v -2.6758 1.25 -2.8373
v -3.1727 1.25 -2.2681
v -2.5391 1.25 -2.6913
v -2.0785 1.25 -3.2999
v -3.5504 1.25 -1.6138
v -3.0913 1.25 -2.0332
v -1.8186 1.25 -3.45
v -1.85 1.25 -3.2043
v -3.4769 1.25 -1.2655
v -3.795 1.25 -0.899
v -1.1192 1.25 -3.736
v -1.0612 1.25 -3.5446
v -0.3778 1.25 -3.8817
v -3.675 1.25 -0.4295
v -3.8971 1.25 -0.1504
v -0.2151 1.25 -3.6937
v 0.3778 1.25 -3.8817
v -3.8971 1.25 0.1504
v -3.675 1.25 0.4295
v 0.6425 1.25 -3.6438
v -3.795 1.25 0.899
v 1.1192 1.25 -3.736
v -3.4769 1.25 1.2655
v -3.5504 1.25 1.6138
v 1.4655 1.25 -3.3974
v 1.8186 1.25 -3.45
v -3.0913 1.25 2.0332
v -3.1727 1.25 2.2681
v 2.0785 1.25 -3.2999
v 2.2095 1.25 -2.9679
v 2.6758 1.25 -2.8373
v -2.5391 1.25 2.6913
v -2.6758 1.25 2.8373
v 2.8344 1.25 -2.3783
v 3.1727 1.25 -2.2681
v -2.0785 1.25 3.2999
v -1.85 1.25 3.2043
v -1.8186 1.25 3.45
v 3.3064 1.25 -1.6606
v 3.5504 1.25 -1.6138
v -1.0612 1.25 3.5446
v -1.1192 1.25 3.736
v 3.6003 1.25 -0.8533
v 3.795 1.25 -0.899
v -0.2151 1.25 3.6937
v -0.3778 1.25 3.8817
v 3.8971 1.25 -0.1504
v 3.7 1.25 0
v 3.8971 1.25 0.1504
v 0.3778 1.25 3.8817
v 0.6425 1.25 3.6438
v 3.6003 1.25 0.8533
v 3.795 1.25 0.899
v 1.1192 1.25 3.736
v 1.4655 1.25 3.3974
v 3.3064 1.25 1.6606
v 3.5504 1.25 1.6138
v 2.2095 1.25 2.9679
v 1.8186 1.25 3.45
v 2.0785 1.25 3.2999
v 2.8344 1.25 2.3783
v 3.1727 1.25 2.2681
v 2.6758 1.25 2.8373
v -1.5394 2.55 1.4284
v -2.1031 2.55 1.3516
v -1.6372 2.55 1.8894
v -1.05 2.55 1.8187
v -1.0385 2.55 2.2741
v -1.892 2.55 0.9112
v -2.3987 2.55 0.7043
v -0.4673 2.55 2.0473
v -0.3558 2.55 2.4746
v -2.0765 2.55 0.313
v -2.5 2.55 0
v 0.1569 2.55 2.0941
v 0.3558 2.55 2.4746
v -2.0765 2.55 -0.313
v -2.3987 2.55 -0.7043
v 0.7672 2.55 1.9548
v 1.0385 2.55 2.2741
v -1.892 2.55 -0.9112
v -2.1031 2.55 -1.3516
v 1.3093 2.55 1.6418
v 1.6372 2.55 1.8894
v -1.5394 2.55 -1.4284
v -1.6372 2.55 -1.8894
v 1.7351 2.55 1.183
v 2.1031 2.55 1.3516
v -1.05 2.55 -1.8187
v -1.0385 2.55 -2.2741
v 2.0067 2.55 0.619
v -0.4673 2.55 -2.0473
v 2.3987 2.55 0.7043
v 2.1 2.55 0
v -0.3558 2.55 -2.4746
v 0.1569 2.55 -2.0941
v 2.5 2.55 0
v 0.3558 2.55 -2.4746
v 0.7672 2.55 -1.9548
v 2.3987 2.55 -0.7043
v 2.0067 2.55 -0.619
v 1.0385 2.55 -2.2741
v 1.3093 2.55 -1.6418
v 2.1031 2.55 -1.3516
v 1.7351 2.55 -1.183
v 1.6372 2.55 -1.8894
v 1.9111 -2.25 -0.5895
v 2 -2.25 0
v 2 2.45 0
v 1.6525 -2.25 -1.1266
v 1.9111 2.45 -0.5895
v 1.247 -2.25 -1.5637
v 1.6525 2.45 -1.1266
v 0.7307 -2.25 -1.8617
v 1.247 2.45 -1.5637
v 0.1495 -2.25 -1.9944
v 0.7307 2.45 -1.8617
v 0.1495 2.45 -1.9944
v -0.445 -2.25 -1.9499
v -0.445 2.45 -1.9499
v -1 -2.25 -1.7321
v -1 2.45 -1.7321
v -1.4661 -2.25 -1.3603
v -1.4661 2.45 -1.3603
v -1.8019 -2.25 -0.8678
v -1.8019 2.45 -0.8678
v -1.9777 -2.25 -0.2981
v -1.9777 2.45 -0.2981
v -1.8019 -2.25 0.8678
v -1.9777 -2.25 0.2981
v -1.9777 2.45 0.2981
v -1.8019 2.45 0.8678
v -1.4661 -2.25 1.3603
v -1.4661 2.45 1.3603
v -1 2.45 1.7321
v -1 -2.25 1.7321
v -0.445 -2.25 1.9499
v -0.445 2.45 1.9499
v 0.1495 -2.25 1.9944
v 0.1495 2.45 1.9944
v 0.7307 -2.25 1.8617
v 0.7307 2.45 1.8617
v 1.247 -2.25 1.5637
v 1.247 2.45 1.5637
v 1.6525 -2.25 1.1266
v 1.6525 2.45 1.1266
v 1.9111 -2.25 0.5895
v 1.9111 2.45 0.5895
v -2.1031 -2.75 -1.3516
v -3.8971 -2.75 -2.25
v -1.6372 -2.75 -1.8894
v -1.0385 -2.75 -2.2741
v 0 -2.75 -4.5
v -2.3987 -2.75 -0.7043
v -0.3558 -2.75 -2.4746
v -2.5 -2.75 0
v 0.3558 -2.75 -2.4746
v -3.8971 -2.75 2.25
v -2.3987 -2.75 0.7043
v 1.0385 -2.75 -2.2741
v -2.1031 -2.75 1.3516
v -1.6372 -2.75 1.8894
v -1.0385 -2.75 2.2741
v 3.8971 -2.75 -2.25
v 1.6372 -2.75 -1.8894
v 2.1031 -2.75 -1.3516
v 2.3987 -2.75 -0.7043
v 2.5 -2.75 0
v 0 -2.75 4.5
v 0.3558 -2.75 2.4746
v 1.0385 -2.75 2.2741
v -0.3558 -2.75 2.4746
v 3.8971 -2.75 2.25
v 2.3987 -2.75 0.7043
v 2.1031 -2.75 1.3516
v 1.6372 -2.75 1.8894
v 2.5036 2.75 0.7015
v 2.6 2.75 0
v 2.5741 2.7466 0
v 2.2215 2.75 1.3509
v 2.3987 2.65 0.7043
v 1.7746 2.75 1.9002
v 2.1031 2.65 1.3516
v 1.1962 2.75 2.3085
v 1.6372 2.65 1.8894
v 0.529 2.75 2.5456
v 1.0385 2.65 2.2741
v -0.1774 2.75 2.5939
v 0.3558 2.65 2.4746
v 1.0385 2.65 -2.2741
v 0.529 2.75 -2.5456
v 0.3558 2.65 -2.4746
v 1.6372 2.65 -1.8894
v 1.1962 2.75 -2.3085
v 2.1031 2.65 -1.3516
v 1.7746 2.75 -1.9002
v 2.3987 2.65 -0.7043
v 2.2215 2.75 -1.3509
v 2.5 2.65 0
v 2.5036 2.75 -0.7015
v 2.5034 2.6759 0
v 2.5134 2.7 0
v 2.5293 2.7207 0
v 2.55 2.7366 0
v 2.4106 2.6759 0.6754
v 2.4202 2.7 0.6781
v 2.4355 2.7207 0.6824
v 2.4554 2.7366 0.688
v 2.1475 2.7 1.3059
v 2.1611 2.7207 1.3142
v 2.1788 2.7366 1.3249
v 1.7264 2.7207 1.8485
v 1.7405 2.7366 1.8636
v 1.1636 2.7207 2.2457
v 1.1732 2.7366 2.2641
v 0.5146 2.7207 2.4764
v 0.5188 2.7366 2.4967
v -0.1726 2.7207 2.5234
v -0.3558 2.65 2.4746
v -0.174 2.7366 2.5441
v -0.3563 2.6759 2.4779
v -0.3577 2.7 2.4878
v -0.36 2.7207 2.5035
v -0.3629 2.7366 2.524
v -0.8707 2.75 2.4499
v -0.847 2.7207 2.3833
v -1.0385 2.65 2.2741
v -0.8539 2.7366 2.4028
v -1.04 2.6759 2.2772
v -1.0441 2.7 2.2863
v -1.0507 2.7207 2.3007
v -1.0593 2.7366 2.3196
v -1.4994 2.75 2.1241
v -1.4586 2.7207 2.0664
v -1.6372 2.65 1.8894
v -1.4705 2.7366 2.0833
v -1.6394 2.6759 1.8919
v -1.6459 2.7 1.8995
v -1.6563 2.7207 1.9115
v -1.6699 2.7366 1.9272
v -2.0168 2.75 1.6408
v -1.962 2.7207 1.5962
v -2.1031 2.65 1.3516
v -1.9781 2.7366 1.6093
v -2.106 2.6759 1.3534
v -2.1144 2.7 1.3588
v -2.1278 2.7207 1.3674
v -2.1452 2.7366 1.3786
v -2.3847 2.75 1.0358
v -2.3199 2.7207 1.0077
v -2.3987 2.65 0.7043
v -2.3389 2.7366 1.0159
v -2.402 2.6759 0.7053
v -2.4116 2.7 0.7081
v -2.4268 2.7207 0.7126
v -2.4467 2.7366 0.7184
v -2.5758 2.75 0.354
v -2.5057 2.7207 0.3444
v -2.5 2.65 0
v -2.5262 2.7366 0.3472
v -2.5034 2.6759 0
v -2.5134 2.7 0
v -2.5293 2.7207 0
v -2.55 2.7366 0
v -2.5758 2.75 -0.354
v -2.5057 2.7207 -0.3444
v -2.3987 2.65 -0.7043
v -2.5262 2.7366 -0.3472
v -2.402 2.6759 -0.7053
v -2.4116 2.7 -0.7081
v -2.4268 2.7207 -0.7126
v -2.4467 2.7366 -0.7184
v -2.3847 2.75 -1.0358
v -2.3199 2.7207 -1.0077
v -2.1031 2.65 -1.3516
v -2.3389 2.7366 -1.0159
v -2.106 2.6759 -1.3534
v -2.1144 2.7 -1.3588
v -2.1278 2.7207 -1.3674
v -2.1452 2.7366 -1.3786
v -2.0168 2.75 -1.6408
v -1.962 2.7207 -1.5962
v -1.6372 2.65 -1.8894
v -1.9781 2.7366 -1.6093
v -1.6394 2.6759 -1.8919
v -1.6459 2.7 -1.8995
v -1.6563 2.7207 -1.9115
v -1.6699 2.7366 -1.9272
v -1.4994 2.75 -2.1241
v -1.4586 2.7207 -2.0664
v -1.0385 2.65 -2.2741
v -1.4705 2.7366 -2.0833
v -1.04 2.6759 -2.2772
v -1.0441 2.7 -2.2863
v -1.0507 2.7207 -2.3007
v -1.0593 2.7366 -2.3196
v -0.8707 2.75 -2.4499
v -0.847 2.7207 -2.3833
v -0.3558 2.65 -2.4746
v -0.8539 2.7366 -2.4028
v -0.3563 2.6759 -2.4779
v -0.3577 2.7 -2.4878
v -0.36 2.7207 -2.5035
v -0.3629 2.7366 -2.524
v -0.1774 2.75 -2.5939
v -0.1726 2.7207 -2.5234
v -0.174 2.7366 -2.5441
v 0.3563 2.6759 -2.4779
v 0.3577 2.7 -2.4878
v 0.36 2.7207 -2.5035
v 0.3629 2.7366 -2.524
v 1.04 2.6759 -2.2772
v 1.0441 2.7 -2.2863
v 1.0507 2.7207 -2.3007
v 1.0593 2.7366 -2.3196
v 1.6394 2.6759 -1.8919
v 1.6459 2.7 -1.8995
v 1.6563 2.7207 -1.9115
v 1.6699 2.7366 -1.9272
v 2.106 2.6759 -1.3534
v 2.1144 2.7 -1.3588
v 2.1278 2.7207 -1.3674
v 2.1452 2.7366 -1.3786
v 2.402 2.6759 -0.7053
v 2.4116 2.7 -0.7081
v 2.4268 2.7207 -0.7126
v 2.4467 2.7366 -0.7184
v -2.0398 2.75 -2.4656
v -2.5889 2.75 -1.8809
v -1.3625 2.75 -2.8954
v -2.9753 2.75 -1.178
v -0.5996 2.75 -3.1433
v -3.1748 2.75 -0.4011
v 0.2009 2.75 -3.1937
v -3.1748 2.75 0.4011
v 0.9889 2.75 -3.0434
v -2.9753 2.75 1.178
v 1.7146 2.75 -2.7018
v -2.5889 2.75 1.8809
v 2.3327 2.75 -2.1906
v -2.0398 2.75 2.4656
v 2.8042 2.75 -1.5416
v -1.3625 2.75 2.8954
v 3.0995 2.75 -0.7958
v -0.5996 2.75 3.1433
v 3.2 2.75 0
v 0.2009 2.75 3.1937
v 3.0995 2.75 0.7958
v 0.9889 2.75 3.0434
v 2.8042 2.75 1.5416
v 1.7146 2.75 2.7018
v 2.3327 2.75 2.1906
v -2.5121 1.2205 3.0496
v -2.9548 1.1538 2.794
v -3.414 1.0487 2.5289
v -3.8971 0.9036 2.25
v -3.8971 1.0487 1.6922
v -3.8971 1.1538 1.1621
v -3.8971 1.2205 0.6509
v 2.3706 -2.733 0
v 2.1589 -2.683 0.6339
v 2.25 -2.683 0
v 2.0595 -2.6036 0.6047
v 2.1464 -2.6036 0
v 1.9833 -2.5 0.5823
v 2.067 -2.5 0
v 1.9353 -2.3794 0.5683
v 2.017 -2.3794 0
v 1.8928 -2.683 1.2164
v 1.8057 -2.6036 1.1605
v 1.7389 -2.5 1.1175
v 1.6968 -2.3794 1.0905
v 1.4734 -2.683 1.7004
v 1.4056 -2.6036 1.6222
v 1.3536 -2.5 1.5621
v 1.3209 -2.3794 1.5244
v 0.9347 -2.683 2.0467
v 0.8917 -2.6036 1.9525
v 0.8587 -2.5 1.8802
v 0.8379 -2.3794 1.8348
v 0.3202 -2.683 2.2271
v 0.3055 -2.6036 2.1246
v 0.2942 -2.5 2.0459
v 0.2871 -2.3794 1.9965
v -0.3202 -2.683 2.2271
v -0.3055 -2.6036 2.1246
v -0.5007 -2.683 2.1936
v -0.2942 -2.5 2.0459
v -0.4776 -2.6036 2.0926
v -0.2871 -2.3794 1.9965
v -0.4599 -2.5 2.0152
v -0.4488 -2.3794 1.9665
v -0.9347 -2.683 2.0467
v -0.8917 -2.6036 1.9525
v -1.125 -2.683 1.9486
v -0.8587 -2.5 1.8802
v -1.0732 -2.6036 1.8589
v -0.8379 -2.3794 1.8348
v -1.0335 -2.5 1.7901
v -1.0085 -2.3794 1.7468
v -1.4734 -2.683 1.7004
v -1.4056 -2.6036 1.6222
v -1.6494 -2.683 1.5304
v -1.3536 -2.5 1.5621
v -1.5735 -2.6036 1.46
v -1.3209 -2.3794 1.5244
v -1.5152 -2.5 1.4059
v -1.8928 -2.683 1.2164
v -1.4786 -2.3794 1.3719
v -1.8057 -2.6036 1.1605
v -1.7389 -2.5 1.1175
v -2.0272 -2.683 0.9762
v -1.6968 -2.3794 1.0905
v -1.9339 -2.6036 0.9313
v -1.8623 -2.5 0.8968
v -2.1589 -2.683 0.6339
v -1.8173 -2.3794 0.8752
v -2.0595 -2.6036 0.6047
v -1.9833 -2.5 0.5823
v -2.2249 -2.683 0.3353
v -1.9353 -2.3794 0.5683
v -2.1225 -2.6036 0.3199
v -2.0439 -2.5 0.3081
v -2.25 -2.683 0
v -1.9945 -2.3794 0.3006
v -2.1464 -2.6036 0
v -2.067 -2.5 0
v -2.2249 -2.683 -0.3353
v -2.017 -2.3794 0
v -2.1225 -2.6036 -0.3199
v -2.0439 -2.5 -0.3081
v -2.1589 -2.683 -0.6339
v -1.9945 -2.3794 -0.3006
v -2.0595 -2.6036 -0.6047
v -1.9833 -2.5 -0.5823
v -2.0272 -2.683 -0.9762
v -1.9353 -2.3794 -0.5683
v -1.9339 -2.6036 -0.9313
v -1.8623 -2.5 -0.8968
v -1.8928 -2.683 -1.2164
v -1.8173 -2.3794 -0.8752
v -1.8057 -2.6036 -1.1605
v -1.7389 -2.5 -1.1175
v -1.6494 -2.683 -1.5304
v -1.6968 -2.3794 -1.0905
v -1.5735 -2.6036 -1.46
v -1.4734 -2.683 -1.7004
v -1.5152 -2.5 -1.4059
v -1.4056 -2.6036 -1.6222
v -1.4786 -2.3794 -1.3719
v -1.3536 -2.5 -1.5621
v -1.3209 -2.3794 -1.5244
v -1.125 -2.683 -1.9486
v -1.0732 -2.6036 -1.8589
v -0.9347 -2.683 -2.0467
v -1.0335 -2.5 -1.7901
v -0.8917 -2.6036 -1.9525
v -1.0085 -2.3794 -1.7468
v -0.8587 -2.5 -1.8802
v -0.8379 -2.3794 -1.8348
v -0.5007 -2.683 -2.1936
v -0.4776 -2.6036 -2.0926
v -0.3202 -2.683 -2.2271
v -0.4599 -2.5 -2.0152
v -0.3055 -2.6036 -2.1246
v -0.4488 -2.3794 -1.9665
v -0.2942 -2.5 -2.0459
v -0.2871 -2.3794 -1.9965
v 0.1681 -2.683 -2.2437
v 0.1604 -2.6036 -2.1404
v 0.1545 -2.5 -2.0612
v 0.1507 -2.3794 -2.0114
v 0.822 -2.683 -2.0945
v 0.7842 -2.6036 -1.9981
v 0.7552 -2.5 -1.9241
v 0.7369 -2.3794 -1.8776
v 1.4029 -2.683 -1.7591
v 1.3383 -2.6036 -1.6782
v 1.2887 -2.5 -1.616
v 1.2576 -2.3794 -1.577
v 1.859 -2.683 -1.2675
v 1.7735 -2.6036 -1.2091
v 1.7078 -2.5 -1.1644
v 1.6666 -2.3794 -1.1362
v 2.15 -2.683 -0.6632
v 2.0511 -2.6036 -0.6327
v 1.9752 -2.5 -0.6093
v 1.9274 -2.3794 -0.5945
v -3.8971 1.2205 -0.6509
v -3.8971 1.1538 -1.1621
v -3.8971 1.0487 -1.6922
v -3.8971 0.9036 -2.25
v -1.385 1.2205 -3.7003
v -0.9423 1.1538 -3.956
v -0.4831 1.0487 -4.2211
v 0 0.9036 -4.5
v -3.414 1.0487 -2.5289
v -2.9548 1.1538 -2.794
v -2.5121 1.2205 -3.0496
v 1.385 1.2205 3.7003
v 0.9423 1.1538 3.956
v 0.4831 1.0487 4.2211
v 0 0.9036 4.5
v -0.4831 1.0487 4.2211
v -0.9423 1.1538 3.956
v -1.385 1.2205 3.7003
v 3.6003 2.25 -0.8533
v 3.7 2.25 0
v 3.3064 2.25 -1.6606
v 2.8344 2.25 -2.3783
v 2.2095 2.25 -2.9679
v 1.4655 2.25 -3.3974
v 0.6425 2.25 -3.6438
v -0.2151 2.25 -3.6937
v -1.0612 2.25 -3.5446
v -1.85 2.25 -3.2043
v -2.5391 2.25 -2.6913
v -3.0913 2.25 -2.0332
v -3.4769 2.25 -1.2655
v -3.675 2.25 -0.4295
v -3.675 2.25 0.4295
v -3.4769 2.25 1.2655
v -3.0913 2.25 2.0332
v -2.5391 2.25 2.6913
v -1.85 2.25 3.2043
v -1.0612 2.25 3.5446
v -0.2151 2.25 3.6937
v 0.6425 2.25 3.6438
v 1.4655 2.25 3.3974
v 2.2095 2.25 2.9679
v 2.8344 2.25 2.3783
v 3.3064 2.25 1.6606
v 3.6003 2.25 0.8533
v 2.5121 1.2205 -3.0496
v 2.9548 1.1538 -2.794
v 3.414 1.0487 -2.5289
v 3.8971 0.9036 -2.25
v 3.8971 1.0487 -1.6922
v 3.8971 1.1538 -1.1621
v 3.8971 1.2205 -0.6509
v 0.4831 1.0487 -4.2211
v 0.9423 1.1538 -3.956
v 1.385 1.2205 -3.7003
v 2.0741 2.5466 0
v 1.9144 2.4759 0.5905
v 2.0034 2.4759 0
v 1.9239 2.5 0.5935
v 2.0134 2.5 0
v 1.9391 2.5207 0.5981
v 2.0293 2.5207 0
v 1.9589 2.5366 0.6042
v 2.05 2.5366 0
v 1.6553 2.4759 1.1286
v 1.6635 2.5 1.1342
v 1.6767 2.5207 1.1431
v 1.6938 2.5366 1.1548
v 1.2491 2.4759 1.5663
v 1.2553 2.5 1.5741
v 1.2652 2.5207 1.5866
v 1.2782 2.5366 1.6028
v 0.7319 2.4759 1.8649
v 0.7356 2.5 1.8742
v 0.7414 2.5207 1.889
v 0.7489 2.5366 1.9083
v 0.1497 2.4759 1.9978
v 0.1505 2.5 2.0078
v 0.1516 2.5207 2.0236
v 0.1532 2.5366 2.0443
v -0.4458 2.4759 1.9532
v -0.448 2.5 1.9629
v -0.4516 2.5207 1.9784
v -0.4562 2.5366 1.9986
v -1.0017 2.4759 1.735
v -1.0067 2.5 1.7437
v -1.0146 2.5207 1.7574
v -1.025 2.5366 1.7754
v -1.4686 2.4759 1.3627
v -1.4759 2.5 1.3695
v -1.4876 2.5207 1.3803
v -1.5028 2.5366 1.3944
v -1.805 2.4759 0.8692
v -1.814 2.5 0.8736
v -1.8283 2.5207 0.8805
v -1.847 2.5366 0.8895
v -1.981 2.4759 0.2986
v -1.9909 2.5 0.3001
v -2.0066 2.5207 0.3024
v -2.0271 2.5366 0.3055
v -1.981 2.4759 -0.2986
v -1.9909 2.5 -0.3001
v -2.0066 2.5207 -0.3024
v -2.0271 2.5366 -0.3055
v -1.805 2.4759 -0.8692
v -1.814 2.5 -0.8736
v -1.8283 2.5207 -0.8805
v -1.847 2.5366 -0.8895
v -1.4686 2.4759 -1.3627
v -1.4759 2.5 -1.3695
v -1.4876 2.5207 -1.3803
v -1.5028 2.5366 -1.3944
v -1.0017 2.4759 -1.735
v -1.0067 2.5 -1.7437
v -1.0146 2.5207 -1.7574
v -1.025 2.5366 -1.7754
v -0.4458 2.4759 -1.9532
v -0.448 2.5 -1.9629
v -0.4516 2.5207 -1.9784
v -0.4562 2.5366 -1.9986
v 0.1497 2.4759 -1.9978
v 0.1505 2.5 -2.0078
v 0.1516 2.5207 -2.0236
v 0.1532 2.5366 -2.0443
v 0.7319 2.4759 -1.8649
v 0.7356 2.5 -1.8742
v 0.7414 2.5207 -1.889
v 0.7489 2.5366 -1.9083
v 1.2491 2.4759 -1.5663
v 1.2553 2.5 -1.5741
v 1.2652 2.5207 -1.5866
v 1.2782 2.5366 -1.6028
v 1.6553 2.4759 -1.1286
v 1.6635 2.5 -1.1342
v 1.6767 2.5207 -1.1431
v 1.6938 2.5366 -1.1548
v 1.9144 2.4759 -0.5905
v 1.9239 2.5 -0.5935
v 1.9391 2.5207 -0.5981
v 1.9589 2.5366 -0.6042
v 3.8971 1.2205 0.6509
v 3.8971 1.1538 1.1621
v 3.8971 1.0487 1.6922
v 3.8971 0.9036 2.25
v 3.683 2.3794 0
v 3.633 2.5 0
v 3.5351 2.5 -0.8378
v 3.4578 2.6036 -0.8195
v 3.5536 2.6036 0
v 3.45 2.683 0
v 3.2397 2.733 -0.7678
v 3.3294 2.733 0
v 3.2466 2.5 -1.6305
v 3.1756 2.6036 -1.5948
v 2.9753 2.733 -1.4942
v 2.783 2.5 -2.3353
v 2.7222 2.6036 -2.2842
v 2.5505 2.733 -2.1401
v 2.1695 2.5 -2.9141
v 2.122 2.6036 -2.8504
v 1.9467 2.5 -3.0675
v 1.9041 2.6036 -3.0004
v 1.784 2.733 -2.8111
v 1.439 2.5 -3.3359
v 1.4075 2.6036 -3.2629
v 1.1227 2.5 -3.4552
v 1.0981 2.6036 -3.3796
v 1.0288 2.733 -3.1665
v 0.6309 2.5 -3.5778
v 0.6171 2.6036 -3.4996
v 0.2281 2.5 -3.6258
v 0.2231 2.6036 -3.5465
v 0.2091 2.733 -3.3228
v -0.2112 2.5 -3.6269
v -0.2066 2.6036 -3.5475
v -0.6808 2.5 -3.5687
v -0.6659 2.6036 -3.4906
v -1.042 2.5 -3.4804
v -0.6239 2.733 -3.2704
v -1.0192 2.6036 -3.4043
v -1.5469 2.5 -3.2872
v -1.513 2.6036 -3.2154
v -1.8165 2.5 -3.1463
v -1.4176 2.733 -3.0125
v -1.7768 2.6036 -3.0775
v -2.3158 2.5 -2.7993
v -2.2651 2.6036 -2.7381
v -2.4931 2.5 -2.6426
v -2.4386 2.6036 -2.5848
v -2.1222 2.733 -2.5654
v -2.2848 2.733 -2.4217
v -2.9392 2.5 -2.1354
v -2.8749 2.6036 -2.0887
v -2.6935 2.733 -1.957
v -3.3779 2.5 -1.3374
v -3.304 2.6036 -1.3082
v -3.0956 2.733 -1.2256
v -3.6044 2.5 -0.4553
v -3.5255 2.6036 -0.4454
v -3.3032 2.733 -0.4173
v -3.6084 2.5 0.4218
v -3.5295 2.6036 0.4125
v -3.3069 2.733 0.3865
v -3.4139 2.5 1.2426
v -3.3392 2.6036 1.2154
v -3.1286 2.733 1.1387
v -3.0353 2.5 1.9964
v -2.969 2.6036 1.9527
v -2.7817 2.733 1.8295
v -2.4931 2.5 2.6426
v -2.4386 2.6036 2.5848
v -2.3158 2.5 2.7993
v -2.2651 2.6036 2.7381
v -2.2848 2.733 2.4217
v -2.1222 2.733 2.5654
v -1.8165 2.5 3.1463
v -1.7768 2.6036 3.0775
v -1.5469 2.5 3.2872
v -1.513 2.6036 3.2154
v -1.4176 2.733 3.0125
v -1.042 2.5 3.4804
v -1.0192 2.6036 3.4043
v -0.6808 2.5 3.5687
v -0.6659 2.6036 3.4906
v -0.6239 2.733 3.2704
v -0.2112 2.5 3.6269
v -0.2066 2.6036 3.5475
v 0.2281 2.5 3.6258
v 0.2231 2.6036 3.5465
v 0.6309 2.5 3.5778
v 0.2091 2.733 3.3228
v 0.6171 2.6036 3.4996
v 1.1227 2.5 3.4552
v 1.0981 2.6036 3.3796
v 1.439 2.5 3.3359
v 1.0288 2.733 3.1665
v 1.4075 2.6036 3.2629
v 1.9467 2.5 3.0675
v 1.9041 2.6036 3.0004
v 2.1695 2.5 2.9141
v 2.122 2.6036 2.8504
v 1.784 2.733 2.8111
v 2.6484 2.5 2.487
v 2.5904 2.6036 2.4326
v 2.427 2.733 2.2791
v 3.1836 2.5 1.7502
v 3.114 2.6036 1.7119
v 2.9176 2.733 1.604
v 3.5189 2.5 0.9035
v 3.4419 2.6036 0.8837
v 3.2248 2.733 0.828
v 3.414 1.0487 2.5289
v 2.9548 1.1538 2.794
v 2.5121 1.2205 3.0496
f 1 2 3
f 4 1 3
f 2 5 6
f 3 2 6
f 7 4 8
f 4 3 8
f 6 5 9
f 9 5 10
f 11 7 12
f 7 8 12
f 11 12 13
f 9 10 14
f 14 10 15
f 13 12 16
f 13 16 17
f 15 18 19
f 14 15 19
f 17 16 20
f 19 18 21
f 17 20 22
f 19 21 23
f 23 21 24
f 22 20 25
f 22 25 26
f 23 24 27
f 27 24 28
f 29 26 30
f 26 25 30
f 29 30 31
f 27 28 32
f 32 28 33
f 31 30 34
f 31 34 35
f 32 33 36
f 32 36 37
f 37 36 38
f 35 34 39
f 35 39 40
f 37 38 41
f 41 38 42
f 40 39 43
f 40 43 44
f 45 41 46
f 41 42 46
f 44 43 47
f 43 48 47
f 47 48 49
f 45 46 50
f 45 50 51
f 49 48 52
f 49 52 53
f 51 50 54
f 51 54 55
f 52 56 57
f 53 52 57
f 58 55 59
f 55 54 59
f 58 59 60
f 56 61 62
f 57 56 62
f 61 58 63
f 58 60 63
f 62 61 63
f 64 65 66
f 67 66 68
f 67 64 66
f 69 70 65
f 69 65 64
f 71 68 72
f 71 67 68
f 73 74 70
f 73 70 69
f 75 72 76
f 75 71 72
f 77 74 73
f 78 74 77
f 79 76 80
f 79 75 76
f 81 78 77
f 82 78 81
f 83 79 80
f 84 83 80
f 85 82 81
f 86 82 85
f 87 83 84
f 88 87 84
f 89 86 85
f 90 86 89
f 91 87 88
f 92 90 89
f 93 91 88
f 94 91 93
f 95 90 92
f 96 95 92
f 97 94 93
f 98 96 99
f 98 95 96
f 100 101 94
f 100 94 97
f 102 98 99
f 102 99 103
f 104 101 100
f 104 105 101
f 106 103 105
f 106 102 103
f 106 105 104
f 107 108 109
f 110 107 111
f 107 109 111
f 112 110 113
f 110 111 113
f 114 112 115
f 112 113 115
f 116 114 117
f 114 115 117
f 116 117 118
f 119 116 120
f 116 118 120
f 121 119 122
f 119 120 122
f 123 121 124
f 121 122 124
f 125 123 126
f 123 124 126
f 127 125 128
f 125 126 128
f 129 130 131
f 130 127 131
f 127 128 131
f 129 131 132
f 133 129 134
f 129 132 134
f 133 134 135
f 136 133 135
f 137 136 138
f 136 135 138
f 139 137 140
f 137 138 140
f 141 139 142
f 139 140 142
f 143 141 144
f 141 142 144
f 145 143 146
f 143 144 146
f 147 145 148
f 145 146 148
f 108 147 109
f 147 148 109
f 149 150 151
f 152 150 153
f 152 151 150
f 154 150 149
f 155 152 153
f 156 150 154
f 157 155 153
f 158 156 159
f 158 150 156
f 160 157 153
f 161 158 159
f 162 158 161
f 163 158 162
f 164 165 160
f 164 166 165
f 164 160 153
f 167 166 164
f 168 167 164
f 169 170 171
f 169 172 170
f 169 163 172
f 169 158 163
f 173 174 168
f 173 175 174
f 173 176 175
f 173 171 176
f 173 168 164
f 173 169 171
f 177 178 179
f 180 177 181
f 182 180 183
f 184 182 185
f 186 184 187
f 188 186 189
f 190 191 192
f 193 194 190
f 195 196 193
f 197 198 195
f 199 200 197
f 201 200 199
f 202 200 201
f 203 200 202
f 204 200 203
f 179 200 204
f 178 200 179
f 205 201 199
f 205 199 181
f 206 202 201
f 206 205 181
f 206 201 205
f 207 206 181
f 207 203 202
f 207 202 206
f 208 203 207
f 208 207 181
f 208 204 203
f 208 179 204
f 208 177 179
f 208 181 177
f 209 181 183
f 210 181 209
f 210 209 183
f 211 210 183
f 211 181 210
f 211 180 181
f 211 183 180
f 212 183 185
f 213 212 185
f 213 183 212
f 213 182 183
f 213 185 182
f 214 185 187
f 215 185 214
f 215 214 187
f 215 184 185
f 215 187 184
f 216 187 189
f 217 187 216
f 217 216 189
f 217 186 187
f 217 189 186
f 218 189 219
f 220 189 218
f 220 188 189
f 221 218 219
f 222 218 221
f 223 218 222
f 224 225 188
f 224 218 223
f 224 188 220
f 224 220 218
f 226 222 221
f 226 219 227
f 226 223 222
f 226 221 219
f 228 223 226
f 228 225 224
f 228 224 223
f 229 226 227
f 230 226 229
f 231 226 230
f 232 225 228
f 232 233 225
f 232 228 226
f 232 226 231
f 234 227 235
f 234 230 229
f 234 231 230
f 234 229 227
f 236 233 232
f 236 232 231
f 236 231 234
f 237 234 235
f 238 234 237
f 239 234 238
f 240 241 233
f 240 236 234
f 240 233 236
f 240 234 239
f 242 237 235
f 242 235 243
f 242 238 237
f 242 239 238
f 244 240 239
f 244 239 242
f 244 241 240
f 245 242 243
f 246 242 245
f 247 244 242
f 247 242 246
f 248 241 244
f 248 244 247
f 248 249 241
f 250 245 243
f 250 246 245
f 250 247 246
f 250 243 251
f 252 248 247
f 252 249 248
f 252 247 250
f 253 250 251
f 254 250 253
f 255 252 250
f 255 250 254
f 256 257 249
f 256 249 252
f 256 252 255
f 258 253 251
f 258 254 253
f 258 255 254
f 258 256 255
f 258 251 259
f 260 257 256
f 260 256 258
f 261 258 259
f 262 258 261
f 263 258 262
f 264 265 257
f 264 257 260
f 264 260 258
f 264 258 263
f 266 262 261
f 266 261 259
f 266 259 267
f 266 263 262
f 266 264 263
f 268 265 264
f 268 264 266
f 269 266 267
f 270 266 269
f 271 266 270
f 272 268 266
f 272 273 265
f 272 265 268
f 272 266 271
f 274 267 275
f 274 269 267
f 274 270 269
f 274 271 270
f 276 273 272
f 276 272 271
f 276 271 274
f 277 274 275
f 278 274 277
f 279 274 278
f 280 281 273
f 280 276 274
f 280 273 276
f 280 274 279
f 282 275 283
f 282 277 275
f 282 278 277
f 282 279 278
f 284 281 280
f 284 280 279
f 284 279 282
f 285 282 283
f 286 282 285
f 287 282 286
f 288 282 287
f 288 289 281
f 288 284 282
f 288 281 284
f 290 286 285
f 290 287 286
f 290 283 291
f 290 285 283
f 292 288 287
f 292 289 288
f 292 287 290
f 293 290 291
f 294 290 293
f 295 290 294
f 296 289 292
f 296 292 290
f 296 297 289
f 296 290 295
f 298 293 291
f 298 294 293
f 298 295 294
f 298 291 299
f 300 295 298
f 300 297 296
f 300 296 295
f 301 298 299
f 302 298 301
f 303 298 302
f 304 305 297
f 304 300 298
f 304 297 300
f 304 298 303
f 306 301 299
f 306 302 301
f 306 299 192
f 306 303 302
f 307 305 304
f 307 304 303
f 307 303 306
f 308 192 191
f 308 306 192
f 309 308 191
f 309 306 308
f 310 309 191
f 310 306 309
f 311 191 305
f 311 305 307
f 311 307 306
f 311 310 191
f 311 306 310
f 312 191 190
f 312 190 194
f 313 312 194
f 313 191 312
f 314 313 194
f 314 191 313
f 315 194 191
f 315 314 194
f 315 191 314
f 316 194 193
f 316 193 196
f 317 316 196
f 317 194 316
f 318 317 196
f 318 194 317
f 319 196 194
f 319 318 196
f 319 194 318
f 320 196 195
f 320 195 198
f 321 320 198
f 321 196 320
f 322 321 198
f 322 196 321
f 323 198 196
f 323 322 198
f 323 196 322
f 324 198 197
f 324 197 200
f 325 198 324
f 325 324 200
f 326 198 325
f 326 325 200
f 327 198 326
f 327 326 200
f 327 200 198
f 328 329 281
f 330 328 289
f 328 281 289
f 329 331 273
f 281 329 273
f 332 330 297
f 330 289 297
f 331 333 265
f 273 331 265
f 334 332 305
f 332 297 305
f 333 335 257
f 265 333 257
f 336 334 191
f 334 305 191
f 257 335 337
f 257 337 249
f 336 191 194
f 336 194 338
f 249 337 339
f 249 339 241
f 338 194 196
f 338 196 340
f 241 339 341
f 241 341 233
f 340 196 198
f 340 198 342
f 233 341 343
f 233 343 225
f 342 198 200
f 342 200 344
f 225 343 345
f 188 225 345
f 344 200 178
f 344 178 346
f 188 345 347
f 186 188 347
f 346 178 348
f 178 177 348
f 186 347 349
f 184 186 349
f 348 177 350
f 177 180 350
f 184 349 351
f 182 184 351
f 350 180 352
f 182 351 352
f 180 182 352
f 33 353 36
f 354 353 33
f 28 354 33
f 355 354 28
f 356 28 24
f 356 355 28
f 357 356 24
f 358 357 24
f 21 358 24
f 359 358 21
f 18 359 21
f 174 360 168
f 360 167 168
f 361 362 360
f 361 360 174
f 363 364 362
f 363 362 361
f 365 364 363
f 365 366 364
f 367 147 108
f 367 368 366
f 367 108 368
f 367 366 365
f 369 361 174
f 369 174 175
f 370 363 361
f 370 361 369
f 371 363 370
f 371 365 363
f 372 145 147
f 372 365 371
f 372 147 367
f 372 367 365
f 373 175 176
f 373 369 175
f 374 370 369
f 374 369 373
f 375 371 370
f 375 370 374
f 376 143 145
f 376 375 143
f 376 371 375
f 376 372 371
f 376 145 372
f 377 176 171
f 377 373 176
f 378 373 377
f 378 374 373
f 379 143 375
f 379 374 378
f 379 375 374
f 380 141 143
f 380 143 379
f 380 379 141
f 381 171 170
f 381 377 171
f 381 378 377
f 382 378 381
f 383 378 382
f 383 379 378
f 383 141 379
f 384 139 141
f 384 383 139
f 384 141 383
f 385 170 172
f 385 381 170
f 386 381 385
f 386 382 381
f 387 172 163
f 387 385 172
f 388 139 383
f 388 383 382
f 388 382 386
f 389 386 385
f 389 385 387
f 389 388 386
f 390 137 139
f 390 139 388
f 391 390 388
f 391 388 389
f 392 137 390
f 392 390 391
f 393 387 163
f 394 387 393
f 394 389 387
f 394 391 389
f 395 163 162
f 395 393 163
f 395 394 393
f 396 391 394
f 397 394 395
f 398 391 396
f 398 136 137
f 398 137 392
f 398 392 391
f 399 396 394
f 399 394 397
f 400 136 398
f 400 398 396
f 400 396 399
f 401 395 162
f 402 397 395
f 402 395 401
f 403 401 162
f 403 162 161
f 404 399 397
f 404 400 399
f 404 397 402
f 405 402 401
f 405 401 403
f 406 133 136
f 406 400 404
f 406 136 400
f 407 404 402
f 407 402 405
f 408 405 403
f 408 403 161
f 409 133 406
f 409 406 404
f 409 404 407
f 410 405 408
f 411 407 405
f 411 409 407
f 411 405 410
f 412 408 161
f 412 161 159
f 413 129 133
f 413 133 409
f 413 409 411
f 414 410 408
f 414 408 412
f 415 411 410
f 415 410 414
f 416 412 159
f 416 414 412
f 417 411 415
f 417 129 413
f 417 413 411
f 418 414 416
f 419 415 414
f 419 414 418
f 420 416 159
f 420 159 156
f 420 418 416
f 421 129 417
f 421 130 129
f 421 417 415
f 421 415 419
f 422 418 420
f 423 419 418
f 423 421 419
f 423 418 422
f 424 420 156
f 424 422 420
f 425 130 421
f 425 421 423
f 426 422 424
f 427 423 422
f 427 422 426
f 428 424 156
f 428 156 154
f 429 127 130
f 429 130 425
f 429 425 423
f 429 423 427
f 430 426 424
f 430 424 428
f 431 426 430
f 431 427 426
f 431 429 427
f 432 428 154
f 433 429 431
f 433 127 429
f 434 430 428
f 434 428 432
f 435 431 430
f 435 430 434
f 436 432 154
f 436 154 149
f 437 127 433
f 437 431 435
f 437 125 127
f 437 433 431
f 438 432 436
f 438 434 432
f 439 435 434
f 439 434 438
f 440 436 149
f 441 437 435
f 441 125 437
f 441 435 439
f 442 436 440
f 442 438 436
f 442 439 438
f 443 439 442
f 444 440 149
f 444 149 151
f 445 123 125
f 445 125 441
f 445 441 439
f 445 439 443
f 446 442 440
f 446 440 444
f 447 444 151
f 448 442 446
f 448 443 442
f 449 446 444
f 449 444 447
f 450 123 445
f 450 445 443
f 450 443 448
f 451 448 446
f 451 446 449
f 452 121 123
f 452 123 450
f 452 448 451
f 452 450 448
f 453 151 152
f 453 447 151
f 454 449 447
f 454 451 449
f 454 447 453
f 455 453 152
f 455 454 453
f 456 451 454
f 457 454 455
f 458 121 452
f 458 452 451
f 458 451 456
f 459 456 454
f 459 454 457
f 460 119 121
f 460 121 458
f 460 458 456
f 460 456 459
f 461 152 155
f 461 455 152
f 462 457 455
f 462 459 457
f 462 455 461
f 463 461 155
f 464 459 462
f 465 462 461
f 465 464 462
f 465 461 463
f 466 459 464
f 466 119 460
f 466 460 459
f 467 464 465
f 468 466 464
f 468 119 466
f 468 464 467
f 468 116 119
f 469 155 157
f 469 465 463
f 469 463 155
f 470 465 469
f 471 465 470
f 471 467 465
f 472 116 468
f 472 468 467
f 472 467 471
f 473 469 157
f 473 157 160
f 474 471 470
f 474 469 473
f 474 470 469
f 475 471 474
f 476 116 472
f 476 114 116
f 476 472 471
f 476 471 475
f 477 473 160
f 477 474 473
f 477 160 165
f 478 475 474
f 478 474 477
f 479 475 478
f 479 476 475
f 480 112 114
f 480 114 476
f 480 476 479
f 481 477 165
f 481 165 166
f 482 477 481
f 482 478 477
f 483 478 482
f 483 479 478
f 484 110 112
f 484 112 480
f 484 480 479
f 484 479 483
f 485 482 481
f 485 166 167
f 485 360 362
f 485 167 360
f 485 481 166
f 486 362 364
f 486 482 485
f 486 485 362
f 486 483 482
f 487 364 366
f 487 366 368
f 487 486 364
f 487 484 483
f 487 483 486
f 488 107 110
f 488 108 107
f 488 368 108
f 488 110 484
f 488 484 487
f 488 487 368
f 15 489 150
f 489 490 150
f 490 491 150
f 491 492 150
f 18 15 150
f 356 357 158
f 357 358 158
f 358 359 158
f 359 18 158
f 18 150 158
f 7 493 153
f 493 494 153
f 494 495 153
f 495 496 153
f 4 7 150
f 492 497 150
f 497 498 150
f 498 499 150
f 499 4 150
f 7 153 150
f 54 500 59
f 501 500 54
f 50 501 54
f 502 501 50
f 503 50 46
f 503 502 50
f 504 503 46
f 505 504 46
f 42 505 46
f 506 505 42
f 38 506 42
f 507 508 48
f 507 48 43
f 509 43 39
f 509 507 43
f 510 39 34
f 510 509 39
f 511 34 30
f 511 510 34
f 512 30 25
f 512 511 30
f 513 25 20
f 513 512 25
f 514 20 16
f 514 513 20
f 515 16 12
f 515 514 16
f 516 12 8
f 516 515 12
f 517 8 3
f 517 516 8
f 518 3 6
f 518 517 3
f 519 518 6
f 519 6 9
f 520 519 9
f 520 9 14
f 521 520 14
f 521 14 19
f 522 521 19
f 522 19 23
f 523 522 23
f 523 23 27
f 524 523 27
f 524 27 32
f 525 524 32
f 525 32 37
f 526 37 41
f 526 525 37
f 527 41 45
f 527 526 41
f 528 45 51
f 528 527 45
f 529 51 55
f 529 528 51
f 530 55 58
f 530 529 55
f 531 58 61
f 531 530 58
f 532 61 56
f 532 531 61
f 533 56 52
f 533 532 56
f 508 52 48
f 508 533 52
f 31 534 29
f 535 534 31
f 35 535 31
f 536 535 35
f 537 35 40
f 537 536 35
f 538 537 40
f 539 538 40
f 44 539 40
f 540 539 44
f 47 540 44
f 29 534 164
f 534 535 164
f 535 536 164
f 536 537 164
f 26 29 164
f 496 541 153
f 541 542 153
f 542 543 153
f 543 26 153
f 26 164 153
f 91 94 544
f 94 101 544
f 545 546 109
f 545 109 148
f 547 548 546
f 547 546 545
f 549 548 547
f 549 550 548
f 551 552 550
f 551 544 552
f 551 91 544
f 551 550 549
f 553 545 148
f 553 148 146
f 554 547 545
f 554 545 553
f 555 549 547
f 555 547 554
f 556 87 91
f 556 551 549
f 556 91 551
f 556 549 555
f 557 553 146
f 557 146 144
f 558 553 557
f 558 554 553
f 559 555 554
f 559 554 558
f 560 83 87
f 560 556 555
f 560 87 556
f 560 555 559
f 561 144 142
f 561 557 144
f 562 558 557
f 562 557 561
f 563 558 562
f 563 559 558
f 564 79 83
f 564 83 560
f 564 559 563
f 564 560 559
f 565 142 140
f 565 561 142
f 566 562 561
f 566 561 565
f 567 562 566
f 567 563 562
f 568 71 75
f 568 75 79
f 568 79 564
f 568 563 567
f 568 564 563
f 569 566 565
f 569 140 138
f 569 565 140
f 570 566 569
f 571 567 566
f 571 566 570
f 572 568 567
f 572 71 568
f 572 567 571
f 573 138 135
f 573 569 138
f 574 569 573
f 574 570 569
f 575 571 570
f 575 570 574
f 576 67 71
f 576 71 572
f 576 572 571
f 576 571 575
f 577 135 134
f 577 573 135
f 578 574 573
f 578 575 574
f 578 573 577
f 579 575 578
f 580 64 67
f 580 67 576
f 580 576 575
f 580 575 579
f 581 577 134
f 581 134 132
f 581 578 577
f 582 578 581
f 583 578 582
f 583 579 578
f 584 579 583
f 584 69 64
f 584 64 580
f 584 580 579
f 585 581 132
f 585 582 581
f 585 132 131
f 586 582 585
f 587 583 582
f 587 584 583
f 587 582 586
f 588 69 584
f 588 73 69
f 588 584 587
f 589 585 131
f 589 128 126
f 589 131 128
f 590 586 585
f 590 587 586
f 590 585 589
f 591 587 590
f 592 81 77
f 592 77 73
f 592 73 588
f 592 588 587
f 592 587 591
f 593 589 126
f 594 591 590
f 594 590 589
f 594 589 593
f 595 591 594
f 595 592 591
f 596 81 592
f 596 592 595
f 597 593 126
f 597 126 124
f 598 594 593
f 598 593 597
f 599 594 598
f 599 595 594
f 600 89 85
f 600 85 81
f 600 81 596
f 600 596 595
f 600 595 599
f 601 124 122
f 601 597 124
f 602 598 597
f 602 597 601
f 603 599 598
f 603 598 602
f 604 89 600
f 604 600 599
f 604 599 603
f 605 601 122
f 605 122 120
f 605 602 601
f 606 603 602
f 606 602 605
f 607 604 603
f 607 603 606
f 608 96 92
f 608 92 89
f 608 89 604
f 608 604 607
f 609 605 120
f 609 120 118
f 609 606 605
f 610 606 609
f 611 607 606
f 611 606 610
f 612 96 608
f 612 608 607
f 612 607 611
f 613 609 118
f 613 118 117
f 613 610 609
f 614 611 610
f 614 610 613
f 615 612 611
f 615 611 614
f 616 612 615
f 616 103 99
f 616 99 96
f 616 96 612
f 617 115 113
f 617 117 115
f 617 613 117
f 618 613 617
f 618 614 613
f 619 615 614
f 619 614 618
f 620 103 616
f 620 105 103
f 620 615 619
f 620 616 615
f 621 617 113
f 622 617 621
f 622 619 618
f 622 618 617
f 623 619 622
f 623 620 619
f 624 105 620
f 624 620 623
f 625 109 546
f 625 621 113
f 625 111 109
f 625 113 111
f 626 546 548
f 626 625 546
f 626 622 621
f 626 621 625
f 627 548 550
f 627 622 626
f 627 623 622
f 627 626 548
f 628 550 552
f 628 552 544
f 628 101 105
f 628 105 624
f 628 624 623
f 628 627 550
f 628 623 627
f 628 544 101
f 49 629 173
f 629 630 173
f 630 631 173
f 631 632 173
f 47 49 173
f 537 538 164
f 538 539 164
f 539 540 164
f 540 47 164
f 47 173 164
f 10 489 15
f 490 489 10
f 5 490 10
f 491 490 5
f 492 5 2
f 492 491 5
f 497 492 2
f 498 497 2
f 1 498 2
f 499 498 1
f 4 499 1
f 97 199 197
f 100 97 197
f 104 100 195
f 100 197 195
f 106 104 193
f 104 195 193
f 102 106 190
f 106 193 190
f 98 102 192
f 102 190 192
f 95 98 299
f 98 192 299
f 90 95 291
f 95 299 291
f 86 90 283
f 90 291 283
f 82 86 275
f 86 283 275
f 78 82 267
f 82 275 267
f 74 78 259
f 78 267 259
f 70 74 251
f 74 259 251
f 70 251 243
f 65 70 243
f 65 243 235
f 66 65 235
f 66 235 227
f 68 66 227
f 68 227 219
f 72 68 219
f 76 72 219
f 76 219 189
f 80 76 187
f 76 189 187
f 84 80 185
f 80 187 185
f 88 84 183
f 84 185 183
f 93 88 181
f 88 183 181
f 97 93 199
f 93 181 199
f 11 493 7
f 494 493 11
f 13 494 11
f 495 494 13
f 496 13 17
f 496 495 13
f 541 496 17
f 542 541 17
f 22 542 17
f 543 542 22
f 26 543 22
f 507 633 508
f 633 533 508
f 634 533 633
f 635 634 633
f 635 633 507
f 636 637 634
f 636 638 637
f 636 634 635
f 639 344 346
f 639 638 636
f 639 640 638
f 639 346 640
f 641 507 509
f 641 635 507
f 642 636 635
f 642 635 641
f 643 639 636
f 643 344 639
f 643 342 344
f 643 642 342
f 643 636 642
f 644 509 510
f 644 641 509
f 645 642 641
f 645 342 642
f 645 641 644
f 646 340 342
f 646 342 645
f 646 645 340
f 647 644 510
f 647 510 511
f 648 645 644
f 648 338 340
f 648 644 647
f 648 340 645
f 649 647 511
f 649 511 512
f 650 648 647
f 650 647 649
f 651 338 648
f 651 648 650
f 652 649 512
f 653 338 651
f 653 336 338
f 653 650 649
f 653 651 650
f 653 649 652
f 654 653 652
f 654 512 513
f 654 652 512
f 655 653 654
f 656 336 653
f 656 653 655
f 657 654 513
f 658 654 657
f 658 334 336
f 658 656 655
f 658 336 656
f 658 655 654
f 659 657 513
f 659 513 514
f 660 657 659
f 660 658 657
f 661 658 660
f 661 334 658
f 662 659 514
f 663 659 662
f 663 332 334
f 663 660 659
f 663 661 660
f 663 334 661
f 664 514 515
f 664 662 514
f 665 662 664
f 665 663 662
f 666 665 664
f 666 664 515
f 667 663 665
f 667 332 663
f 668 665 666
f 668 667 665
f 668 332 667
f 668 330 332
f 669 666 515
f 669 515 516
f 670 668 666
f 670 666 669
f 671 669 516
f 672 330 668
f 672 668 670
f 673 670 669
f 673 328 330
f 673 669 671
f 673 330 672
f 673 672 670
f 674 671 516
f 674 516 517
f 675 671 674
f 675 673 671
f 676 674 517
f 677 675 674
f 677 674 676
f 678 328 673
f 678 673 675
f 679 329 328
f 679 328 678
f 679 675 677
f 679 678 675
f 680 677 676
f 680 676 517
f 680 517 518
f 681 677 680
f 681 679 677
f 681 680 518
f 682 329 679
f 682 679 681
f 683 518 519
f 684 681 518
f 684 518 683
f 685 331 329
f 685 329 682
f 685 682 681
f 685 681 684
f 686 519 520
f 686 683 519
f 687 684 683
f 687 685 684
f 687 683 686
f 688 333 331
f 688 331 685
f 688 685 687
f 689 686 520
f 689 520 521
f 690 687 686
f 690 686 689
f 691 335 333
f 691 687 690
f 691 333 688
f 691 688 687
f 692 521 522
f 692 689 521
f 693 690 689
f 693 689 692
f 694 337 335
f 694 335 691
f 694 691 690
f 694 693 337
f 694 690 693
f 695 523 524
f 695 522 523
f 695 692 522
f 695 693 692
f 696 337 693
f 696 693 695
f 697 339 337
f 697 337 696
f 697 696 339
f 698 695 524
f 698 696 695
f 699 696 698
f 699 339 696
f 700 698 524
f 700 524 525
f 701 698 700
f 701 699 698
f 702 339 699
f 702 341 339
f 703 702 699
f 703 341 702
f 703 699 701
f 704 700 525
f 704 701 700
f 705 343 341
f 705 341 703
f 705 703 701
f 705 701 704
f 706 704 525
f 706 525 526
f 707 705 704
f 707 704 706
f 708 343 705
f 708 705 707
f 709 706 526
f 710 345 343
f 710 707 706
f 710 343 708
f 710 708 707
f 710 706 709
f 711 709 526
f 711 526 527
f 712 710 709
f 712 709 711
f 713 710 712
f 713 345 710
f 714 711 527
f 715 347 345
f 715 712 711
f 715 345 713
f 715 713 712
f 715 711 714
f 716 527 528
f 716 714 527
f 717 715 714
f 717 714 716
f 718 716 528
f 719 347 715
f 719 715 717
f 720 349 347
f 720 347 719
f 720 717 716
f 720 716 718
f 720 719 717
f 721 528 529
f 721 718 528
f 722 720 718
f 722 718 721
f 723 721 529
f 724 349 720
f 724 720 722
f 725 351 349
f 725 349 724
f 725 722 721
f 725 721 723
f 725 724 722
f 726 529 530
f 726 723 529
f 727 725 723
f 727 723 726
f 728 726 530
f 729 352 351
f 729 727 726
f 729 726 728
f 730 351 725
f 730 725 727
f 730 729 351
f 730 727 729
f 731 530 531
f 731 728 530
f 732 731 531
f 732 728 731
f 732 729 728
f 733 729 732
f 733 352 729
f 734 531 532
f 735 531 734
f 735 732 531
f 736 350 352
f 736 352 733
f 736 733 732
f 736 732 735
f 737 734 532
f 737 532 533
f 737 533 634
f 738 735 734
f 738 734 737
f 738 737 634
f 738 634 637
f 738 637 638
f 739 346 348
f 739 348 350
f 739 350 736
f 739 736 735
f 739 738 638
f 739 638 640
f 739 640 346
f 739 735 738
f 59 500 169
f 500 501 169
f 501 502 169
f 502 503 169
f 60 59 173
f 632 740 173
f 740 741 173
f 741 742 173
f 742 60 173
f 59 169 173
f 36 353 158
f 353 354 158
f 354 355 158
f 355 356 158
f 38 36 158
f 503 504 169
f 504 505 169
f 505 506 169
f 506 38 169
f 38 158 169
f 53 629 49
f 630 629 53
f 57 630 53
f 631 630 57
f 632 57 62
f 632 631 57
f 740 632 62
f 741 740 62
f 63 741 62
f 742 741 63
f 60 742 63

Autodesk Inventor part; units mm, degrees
ref_plane "YZ Plane" through (0, 0, 0) normal (1, 0, 0) x (0, 1, 0)
ref_plane "XZ Plane" through (0, 0, 0) normal (0, 1, 0) x (-1, 0, 0)
ref_plane "XY Plane" through (0, 0, 0) normal (0, 0, 1) x (1, 0, 0)
sketch "スケッチ1" plane through (0, 0, 0) normal (0, 0, 1) x (1, 0, 0)
  line L0 (4.5, 0.9036) -> (4.5, -2.75)
  line L1 (4.5, -2.75) -> (2, -2.75)
  line L2 (0, 2.75) -> (0, -2.75)
  line L3 (3.9, 1.25) -> (4.5, 0.9036)
  line L4 (2, -2.75) -> (2, 2.75)
  line L5 (2, 2.75) -> (3.7, 2.75)
  line L6 (3.9, 1.25) -> (3.7, 1.25)
  line L7 (3.7, 1.25) -> (3.7, 2.75)
  point P0 (0, 0)
  dimension "d3" = 4.5
  dimension "d14" = 2.75
  dimension "d15" = 5.5
  dimension "d16" = 2.75
  dimension "d17" = 5.5
  dimension "d18" = 2.5
  dimension "d20" = 120
  dimension "d28" = 1.7
  dimension "d29" = 1.5
  dimension "d30" = 0.2
revolve "回転1" add sketch "スケッチ1" angle 360 about axis through (0, 2.75, 0) along (0, -1, 0)
sketch "スケッチ3" plane through (0, -2.75, 0) normal (0, -1, 0) x (1, 0, 0)
  circle A0 centre (0, 0) radius 2 projected
  circle A1 centre (0, 0) radius 4.5 projected
  line L0 (0, 4.5) -> (3.8971, 2.25)
  line L1 (3.8971, 2.25) -> (3.8971, -2.25)
  line L2 (3.8971, -2.25) -> (0, -4.5)
  line L3 (0, -4.5) -> (-3.8971, -2.25)
  line L4 (-3.8971, -2.25) -> (-3.8971, 2.25)
  line L5 (-3.8971, 2.25) -> (0, 4.5)
  dimension "d23" = 2.25
extrude "押し出し2" cut sketch "スケッチ3" against normal blind 5.5 contours L1 L2 L3 L4 L5 L0 keep common part
fillet "フィレット1" radius 0.5 2 edges at (-3.7, 2.75, 0) (-2, -2.75, 0)
sketch "スケッチ4" plane through (0, 2.75, 0) normal (0, 1, 0) x (1, 0, 0)
  circle A0 centre (0, 0) radius 2 projected
  circle A1 centre (0, 0) radius 3.2 projected
  circle A2 centre (0, 0) radius 2.5
  dimension "d32" = 5
extrude "押し出し3" cut sketch "スケッチ4" against normal blind 0.2 contours A2
fillet "フィレット2" radius 0.1 2 edges at (-2, 2.55, 0) (-2.5, 2.75, 0)
thread "ねじ3" size "M4x0.7" class "6H" standard "ANSI Metric M Profile" full length
properties material "ステンレス鋼"
